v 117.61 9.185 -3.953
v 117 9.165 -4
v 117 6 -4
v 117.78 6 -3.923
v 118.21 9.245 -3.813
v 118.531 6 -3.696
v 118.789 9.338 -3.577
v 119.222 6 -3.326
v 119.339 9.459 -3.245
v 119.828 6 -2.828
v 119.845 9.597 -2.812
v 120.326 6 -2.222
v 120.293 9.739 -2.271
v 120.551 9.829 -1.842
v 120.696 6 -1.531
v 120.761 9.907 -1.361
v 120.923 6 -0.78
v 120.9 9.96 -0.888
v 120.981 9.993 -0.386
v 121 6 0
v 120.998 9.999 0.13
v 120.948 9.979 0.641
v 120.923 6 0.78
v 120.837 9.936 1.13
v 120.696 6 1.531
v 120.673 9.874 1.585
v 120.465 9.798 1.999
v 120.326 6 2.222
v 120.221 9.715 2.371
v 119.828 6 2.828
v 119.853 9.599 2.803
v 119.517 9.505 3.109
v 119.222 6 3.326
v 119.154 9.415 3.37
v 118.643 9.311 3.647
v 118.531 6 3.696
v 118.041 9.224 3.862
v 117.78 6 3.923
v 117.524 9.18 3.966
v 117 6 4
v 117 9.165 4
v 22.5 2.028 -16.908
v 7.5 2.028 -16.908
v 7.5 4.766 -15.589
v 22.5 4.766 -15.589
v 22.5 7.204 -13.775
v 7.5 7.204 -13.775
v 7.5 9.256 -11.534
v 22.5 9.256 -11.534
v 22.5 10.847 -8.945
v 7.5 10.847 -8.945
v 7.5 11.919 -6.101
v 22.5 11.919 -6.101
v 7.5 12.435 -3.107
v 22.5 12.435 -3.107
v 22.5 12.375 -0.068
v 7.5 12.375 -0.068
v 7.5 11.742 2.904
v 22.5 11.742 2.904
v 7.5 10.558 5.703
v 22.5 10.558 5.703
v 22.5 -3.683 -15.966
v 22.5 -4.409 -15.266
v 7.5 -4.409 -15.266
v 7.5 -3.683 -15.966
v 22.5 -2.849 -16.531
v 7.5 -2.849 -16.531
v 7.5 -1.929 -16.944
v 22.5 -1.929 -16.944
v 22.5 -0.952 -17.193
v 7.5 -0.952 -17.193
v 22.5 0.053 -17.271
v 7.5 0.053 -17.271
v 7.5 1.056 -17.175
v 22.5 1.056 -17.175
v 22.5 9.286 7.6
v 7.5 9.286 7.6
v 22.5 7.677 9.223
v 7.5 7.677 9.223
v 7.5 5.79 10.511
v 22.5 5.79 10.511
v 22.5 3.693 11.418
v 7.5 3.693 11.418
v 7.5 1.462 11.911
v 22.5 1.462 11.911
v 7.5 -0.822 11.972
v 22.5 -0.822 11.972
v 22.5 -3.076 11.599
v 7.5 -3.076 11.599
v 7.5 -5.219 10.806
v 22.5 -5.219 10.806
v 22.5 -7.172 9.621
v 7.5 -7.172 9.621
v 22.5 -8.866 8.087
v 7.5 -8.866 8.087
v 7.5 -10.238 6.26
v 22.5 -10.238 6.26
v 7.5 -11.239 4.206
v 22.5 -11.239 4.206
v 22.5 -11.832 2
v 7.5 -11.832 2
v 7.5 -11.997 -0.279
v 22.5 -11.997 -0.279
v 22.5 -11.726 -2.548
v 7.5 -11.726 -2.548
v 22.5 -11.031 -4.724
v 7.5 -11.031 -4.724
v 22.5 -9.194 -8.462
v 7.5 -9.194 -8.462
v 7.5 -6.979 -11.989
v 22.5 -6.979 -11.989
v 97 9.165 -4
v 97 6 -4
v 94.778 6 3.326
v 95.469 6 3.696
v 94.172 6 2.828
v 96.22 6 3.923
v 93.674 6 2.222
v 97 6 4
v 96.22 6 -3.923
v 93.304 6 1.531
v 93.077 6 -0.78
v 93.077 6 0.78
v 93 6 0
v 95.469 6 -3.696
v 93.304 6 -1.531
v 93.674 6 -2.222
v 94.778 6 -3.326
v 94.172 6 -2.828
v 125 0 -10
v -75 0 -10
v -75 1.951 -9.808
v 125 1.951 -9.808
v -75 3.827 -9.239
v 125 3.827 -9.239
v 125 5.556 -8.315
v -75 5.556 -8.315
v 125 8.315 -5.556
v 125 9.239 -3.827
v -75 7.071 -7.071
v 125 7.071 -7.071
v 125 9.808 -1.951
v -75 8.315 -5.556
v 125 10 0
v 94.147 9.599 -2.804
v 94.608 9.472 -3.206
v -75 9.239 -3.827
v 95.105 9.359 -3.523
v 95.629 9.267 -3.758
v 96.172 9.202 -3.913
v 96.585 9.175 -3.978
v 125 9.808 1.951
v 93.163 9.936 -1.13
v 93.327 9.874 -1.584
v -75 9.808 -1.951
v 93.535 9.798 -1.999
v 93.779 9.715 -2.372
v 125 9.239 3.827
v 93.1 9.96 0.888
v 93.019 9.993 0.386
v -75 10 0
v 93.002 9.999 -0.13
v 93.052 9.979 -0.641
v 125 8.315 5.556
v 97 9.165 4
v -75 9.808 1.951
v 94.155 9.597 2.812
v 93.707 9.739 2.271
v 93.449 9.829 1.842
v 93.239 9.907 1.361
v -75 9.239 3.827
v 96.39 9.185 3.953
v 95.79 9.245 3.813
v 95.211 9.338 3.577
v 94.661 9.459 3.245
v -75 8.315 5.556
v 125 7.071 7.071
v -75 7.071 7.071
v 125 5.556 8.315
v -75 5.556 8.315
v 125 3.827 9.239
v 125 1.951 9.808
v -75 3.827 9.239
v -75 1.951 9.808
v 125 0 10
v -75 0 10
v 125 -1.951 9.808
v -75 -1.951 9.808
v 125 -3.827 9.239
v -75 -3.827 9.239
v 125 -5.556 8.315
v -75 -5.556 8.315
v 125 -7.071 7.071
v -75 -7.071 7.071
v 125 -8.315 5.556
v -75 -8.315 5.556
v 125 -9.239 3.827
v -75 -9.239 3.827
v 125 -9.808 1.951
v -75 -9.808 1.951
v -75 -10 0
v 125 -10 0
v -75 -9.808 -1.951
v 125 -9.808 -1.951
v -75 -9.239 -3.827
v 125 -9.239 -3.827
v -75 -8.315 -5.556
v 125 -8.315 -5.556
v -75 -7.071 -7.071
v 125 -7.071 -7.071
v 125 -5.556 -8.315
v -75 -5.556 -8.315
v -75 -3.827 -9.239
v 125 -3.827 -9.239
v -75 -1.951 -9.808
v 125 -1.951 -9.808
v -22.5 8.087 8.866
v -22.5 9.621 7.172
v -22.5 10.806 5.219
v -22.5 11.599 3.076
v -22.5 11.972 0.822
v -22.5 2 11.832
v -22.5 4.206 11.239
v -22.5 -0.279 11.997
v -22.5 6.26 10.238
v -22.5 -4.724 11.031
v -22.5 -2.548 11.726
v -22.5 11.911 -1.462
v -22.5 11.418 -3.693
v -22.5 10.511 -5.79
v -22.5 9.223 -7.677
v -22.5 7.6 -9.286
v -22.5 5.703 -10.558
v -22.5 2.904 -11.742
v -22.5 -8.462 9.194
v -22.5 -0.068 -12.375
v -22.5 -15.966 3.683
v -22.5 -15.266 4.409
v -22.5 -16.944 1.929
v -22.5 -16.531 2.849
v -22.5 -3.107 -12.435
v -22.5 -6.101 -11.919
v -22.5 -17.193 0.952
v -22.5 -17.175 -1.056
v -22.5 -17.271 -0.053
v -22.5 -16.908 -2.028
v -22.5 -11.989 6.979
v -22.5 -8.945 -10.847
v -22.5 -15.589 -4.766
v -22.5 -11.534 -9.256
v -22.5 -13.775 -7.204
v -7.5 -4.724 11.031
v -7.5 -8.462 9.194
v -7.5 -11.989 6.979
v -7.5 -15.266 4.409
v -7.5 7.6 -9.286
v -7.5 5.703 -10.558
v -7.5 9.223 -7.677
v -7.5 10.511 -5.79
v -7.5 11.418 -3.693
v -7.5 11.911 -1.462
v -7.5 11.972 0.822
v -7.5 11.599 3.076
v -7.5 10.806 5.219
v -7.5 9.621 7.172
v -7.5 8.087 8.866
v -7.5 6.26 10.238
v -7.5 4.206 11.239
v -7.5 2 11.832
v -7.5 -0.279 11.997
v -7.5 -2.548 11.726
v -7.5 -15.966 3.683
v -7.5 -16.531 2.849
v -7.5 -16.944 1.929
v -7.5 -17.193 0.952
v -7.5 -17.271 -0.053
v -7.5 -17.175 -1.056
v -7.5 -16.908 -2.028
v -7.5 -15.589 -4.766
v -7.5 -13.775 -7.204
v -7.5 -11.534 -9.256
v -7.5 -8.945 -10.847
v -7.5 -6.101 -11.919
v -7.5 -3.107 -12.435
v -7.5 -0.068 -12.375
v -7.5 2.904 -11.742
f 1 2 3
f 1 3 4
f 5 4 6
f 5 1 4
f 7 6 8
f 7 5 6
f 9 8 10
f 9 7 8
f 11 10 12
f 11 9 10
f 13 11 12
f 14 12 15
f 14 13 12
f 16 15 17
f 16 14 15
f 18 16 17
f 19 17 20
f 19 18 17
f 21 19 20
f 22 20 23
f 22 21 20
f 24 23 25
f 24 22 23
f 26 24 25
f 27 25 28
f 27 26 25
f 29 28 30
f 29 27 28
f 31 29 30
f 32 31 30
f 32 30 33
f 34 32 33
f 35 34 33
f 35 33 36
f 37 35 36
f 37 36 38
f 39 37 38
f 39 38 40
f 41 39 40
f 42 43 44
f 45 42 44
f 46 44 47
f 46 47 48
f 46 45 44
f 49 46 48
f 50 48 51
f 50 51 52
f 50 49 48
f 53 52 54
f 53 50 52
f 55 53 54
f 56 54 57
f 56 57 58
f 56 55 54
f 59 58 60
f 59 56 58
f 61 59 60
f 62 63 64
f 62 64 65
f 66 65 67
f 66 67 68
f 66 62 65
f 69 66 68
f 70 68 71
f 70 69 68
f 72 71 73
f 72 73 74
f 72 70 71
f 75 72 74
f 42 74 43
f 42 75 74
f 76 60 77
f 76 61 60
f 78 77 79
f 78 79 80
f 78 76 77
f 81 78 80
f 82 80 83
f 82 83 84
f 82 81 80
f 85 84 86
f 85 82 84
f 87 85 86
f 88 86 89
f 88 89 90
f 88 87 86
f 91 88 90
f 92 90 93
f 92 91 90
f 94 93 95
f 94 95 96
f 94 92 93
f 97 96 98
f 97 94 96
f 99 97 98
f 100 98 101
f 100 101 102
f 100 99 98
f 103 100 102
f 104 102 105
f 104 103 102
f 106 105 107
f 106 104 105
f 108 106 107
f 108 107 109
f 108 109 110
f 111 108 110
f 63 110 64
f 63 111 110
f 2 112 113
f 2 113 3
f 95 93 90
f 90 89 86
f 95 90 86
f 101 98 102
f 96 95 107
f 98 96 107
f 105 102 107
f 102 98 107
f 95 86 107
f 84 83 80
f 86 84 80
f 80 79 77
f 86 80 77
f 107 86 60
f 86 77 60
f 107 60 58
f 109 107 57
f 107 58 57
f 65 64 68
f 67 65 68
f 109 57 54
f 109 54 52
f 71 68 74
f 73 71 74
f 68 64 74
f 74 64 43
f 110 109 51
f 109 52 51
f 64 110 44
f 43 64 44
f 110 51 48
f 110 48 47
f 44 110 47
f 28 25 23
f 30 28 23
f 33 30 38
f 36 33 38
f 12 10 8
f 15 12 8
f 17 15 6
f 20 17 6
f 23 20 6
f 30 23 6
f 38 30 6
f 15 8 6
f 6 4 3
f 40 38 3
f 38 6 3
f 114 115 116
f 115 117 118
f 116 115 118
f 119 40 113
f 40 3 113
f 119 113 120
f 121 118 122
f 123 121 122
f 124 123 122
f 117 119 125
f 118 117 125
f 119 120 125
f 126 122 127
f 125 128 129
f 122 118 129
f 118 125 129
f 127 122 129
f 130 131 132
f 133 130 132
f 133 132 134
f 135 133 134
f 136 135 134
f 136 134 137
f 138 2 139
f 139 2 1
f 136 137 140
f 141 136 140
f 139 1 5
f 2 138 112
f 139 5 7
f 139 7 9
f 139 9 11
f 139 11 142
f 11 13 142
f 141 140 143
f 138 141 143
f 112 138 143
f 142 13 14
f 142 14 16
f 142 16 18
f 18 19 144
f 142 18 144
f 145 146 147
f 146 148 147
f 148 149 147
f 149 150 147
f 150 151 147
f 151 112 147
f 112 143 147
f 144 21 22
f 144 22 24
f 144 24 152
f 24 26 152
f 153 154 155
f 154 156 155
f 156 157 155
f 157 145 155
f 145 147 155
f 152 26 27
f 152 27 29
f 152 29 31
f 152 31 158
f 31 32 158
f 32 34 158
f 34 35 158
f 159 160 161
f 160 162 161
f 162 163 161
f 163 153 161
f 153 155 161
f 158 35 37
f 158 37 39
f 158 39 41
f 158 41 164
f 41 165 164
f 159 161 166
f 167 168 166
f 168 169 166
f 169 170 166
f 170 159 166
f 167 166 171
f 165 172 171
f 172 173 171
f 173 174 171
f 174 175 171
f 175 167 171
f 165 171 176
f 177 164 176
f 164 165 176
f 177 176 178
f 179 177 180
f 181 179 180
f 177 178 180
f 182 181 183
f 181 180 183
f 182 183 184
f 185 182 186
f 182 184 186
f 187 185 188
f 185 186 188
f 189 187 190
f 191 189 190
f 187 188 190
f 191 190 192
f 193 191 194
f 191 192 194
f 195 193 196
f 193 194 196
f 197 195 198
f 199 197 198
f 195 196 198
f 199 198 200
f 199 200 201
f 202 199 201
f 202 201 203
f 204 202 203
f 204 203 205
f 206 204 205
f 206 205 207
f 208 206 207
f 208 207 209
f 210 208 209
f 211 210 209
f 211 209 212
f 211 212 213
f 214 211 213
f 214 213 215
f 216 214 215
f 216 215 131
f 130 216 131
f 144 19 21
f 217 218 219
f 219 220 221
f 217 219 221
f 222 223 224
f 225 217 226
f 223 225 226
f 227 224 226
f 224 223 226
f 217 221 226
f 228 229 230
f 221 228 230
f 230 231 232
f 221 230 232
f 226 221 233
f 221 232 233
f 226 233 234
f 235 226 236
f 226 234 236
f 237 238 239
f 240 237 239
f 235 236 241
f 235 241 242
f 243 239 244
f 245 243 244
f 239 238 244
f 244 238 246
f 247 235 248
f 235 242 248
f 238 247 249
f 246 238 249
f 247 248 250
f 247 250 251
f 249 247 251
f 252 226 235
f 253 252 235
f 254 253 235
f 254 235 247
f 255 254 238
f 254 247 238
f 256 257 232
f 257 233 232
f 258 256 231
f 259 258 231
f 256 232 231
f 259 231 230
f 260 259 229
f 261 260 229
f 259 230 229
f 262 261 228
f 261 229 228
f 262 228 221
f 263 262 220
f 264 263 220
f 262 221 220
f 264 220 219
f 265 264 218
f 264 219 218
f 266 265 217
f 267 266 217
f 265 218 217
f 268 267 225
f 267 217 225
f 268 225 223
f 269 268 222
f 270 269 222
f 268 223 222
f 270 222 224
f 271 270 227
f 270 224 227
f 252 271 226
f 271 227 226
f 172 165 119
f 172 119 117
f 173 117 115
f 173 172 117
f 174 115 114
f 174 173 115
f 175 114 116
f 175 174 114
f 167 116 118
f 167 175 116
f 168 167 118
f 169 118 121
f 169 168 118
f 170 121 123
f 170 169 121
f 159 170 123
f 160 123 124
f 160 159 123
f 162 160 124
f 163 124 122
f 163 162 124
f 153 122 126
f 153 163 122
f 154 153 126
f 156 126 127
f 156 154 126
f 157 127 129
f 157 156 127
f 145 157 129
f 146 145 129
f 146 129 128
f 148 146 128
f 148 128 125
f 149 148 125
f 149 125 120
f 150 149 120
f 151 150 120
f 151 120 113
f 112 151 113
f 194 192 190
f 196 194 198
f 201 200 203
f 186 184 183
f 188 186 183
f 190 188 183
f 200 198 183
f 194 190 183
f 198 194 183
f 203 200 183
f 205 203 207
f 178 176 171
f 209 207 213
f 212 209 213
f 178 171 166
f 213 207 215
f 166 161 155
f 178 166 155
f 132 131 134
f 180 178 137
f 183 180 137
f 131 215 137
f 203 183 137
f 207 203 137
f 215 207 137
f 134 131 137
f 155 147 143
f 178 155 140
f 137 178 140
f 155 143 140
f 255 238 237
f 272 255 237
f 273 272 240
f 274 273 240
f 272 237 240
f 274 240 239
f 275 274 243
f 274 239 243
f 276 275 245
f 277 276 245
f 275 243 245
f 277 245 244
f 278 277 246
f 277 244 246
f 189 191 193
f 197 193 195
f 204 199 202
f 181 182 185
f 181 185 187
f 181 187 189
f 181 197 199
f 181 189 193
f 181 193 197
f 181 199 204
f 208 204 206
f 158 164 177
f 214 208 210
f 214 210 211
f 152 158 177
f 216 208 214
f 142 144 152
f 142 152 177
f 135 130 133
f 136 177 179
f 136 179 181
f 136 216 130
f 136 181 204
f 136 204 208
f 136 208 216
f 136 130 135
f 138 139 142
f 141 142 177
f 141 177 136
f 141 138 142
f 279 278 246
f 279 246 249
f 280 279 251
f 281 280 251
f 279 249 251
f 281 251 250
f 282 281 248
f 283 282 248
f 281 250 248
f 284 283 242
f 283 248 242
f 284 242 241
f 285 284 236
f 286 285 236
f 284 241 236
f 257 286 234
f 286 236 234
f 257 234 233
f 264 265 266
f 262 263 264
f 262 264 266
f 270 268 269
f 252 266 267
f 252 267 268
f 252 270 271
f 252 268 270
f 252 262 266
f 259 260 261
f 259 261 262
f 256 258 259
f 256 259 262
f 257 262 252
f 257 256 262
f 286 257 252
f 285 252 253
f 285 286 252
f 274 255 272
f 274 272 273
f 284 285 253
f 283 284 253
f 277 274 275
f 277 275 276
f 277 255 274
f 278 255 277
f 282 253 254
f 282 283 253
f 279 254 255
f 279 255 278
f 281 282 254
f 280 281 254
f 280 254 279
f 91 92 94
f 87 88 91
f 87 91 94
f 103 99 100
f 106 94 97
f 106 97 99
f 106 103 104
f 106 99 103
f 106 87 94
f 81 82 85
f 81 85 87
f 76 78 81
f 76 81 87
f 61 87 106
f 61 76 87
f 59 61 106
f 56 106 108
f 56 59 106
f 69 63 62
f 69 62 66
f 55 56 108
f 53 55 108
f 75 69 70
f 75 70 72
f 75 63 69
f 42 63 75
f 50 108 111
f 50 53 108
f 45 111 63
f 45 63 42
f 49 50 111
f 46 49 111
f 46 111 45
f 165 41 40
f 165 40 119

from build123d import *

# Parameters (mm, degrees)
BOSS_EXTRUDE1_DEPTH      = 125
BOSS_EXTRUDE1_DEPTH_BACK = 75
SKETCH1_R                = 10
BOSS_EXTRUDE2_START      = 15
BOSS_EXTRUDE2_DEPTH      = 7.5
BODY_MOVE_COPY1_ANGLE    = 90
CUT_EXTRUDE1_DEPTH       = 4


with BuildPart() as part:
    # Sketch1 → Boss-Extrude1 (new, two sides: drawn at the far end of the back side and taken through both)
    with BuildSketch(Plane(origin=(0, 0, 0), x_dir=(0, 0, -1), z_dir=(1, 0, 0)).offset(-BOSS_EXTRUDE1_DEPTH_BACK)):
        Circle(SKETCH1_R)
    extrude(amount=BOSS_EXTRUDE1_DEPTH + BOSS_EXTRUDE1_DEPTH_BACK)

    # Sketch3 → Cut-Extrude1 (cut)
    with BuildSketch(Plane(origin=(0, 10, 0), x_dir=(1, 0, 0), z_dir=(0, 1, 0))):
        with BuildLine():
            Line((117, -4), (97, -4))
            ThreePointArc((97, -4), (93, 0), (97, 4))
            Line((97, 4), (117, 4))
            ThreePointArc((117, 4), (121, 0), (117, -4))
        make_face()
    extrude(amount=-CUT_EXTRUDE1_DEPTH, mode=Mode.SUBTRACT)


with BuildPart() as body_2:
    # Sketch2 → Boss-Extrude2 (new, symmetric)
    with BuildSketch(Plane(origin=(0, 0, 0), x_dir=(0, 0, -1), z_dir=(1, 0, 0)).offset(BOSS_EXTRUDE2_START)):
        with BuildLine():
            ThreePointArc((-5.702512036, 10.558473208), (-10.805824842, -5.218634829), (4.724055073, -11.031015532))
            ThreePointArc((4.724055073, -11.031015532), (10.25419488, -8.132628826), (15.265932902, -4.408978227))
            ThreePointArc((15.265932902, -4.408978227), (17.089577392, -1.44606998), (16.908216525, 2.028352669))
            ThreePointArc((16.908216525, 2.028352669), (7.548461042, 11.450624047), (-5.702512036, 10.558473208))
        make_face()
    extrude(amount=BOSS_EXTRUDE2_DEPTH, both=True)


with BuildPart() as body_3:
    # Mirror1: mirrored copy
    add(body_2.part.mirror(Plane(origin=(0, 0, 0), x_dir=(0, 0, 1), z_dir=(1, 0, 0))))


with BuildPart() as body_3_1:
    # Body-Move/Copy1: moved
    add(body_3.part.rotate(Axis((0, 0, 0), (-1, 0, 0)), BODY_MOVE_COPY1_ANGLE))


solid = Compound([part.part, body_2.part, body_3_1.part])
